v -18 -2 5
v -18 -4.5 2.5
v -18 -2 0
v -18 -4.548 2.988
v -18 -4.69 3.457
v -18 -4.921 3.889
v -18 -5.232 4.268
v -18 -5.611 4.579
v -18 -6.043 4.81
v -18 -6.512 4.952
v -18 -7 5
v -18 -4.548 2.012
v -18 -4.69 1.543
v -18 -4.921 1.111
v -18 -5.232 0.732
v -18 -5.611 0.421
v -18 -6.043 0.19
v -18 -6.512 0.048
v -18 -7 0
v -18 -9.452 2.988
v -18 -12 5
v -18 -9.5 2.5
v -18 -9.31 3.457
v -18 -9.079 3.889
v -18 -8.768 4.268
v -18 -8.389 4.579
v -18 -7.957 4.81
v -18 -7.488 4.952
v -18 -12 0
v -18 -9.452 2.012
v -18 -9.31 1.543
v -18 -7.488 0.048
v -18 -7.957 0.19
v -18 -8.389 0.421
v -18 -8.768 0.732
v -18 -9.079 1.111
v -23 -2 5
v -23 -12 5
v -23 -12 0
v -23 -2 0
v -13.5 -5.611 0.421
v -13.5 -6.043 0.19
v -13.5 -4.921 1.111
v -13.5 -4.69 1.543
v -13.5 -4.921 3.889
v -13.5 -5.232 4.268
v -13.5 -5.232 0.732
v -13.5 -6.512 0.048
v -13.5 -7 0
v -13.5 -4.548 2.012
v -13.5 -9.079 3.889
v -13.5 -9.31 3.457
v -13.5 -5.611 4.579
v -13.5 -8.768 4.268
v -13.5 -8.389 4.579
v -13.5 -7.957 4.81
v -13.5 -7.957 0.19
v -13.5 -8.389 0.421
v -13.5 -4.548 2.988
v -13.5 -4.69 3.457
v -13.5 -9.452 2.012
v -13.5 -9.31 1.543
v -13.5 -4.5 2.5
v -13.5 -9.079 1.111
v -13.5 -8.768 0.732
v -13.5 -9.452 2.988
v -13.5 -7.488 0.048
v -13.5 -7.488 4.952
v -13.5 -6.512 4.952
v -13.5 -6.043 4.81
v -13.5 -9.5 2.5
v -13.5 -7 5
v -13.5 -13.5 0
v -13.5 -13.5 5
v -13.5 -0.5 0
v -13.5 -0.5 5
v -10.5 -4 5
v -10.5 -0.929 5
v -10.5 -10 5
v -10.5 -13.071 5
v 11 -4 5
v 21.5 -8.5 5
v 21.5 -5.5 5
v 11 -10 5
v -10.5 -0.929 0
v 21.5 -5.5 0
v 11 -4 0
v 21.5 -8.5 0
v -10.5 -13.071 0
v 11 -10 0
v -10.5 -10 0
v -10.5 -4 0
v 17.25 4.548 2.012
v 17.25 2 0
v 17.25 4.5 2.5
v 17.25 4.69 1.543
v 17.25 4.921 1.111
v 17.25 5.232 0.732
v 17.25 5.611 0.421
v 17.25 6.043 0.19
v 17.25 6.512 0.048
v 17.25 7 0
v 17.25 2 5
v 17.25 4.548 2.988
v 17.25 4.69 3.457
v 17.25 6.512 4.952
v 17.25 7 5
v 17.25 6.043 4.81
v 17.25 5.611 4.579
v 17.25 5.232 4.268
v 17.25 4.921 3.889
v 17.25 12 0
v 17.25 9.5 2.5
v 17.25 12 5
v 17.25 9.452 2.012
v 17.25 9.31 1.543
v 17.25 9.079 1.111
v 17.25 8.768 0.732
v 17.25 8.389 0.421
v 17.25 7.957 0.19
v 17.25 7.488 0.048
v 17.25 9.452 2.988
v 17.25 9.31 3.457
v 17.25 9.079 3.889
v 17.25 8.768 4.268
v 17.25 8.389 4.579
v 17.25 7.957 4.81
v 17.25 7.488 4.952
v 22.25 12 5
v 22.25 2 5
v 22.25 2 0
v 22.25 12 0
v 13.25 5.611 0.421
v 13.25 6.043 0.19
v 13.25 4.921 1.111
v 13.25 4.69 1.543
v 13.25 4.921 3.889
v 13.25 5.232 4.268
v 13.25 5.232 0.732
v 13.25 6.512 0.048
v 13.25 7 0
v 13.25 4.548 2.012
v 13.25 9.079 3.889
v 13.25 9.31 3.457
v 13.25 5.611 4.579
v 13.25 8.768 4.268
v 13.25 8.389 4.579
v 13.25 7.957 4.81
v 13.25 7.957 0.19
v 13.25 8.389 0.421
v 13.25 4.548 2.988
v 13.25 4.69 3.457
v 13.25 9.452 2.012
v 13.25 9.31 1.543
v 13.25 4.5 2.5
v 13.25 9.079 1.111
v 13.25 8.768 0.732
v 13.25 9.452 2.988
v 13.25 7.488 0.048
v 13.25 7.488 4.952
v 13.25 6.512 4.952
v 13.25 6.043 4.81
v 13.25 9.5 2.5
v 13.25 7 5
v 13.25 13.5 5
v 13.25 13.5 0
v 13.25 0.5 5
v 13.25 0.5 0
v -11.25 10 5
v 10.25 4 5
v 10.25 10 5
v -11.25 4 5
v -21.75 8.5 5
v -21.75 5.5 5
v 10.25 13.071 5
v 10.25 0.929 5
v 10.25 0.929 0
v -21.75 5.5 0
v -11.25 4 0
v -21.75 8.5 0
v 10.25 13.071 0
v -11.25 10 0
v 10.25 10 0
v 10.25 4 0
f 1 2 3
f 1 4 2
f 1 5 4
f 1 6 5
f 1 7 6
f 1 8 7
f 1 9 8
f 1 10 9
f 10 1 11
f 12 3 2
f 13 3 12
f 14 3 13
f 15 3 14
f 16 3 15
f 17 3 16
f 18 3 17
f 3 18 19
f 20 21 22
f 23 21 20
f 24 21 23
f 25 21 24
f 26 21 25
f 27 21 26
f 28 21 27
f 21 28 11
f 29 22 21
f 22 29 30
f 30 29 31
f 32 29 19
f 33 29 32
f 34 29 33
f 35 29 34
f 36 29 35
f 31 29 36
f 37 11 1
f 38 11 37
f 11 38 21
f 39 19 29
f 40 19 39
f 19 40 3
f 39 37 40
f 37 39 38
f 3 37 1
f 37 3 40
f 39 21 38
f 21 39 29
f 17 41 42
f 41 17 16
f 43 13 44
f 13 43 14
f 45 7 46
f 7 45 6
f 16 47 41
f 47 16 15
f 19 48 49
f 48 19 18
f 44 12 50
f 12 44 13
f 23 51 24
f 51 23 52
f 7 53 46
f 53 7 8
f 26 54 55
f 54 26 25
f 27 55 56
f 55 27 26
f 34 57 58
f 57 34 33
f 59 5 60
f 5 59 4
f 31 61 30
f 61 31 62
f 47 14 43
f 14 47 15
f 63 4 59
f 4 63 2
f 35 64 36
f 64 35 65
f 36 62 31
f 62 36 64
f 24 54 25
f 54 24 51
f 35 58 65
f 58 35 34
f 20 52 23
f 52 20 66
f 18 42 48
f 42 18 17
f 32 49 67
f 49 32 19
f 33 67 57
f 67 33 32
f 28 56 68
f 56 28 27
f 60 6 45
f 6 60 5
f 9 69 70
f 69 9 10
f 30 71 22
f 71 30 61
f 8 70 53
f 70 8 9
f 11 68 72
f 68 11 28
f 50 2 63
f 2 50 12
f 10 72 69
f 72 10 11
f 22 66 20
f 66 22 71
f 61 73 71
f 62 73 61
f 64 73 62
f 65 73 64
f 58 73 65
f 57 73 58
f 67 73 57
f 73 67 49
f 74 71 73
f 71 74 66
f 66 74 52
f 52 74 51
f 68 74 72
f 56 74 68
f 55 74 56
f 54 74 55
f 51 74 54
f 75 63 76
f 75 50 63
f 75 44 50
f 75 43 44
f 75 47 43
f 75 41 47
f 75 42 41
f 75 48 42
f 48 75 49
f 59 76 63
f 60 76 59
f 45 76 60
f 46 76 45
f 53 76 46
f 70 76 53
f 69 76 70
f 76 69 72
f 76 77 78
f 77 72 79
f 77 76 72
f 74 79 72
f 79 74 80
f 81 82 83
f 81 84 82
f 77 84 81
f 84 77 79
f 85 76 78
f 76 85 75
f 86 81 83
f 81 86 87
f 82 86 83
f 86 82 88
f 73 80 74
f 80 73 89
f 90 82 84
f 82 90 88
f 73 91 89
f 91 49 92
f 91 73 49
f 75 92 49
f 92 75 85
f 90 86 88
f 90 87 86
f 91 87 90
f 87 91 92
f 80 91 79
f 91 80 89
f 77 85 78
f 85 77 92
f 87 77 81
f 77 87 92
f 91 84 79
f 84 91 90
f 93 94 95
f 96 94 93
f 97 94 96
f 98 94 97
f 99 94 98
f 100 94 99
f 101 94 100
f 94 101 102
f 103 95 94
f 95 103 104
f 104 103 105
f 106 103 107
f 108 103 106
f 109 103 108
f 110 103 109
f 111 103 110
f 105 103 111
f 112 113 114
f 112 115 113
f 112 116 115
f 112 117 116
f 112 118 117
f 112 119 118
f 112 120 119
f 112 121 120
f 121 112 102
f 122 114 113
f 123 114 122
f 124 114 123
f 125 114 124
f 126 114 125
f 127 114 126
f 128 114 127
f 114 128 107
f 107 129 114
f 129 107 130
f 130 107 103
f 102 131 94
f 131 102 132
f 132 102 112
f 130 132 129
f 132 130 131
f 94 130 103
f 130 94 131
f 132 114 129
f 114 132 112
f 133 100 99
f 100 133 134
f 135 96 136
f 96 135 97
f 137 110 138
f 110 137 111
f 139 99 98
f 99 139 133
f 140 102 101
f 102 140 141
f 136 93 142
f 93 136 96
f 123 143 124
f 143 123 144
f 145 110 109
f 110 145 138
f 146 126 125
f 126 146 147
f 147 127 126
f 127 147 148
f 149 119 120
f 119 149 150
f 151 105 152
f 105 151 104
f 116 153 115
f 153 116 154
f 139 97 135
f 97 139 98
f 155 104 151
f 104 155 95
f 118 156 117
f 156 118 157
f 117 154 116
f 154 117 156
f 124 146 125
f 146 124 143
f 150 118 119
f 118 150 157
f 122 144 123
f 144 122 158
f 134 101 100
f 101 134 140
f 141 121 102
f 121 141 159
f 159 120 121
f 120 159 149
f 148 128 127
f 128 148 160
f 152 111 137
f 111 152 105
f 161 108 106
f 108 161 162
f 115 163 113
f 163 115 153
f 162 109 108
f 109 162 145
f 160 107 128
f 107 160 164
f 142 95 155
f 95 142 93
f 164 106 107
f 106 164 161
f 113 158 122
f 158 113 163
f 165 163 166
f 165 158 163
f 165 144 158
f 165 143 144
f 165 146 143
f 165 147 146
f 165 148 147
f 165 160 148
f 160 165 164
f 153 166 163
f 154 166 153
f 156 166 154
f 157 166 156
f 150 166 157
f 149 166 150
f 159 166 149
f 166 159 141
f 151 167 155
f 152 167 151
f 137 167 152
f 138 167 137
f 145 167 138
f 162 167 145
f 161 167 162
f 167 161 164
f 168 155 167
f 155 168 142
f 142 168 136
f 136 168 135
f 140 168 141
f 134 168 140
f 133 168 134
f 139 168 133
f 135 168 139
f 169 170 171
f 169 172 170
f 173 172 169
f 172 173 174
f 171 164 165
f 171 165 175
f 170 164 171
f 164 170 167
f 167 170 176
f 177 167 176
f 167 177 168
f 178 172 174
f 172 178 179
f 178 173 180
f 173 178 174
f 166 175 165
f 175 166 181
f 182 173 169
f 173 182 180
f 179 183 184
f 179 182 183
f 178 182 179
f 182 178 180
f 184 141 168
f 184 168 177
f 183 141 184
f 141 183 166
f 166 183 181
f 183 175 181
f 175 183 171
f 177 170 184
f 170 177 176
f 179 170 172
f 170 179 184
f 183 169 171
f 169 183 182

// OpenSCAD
$fa = 10;
$fs = 0.5;
$fn = 0;

module dryerpart(l1 = 5, b1 = 10, l2 = 5, l3 = 35, b3 = 13, b4 = 3,
		h = 5, x = 3, y = 6)
{
	intersection()
	{
		union()
		{
			translate([ 0, -b1/2, 0 ])
			cube([ l1, b1, h ]);
		
			translate([ l1-1, 0, h/2 ])
			rotate([ 0, 90, 0 ])
			cylinder(h = l2+2, r = h/2);
		
			translate([ l1+l2, -b3/2, 0 ])
			polyhedron(
				points = [
					[ 0, b3, h ],
					[ 0, b3, 0 ],
					[ 0, 0, 0 ],
					[ 0, 0, h ],
					[ l3, b3/2+b4/2, h ],
					[ l3, b3/2+b4/2, 0 ],
					[ l3, b3/2-b4/2, h ],
					[ l3, b3/2-b4/2, 0 ],
				],
				triangles = [
					[ 3, 2, 1, 0 ],
					[ 0, 1, 5, 4 ],
					[ 2, 3, 6, 7 ],
					[ 1, 2, 7, 5 ],
					[ 0, 4, 6, 3 ],
					[ 4, 5, 7, 6 ]
				]
			);
		}
		union()
		{
			cube([ (l1+l2+x)*2, (b1+b3)*2, h*3 ], center = true);
			cube([ (l1+l2+l3+x)*2, y, h*3 ], center = true);

		}
	}
}

translate([ -23, -7, 0])
dryerpart(l2 = 4.5);

translate([ +22.25, +7, 0])
rotate([0, 0, 180])
dryerpart(l2 = 4);
